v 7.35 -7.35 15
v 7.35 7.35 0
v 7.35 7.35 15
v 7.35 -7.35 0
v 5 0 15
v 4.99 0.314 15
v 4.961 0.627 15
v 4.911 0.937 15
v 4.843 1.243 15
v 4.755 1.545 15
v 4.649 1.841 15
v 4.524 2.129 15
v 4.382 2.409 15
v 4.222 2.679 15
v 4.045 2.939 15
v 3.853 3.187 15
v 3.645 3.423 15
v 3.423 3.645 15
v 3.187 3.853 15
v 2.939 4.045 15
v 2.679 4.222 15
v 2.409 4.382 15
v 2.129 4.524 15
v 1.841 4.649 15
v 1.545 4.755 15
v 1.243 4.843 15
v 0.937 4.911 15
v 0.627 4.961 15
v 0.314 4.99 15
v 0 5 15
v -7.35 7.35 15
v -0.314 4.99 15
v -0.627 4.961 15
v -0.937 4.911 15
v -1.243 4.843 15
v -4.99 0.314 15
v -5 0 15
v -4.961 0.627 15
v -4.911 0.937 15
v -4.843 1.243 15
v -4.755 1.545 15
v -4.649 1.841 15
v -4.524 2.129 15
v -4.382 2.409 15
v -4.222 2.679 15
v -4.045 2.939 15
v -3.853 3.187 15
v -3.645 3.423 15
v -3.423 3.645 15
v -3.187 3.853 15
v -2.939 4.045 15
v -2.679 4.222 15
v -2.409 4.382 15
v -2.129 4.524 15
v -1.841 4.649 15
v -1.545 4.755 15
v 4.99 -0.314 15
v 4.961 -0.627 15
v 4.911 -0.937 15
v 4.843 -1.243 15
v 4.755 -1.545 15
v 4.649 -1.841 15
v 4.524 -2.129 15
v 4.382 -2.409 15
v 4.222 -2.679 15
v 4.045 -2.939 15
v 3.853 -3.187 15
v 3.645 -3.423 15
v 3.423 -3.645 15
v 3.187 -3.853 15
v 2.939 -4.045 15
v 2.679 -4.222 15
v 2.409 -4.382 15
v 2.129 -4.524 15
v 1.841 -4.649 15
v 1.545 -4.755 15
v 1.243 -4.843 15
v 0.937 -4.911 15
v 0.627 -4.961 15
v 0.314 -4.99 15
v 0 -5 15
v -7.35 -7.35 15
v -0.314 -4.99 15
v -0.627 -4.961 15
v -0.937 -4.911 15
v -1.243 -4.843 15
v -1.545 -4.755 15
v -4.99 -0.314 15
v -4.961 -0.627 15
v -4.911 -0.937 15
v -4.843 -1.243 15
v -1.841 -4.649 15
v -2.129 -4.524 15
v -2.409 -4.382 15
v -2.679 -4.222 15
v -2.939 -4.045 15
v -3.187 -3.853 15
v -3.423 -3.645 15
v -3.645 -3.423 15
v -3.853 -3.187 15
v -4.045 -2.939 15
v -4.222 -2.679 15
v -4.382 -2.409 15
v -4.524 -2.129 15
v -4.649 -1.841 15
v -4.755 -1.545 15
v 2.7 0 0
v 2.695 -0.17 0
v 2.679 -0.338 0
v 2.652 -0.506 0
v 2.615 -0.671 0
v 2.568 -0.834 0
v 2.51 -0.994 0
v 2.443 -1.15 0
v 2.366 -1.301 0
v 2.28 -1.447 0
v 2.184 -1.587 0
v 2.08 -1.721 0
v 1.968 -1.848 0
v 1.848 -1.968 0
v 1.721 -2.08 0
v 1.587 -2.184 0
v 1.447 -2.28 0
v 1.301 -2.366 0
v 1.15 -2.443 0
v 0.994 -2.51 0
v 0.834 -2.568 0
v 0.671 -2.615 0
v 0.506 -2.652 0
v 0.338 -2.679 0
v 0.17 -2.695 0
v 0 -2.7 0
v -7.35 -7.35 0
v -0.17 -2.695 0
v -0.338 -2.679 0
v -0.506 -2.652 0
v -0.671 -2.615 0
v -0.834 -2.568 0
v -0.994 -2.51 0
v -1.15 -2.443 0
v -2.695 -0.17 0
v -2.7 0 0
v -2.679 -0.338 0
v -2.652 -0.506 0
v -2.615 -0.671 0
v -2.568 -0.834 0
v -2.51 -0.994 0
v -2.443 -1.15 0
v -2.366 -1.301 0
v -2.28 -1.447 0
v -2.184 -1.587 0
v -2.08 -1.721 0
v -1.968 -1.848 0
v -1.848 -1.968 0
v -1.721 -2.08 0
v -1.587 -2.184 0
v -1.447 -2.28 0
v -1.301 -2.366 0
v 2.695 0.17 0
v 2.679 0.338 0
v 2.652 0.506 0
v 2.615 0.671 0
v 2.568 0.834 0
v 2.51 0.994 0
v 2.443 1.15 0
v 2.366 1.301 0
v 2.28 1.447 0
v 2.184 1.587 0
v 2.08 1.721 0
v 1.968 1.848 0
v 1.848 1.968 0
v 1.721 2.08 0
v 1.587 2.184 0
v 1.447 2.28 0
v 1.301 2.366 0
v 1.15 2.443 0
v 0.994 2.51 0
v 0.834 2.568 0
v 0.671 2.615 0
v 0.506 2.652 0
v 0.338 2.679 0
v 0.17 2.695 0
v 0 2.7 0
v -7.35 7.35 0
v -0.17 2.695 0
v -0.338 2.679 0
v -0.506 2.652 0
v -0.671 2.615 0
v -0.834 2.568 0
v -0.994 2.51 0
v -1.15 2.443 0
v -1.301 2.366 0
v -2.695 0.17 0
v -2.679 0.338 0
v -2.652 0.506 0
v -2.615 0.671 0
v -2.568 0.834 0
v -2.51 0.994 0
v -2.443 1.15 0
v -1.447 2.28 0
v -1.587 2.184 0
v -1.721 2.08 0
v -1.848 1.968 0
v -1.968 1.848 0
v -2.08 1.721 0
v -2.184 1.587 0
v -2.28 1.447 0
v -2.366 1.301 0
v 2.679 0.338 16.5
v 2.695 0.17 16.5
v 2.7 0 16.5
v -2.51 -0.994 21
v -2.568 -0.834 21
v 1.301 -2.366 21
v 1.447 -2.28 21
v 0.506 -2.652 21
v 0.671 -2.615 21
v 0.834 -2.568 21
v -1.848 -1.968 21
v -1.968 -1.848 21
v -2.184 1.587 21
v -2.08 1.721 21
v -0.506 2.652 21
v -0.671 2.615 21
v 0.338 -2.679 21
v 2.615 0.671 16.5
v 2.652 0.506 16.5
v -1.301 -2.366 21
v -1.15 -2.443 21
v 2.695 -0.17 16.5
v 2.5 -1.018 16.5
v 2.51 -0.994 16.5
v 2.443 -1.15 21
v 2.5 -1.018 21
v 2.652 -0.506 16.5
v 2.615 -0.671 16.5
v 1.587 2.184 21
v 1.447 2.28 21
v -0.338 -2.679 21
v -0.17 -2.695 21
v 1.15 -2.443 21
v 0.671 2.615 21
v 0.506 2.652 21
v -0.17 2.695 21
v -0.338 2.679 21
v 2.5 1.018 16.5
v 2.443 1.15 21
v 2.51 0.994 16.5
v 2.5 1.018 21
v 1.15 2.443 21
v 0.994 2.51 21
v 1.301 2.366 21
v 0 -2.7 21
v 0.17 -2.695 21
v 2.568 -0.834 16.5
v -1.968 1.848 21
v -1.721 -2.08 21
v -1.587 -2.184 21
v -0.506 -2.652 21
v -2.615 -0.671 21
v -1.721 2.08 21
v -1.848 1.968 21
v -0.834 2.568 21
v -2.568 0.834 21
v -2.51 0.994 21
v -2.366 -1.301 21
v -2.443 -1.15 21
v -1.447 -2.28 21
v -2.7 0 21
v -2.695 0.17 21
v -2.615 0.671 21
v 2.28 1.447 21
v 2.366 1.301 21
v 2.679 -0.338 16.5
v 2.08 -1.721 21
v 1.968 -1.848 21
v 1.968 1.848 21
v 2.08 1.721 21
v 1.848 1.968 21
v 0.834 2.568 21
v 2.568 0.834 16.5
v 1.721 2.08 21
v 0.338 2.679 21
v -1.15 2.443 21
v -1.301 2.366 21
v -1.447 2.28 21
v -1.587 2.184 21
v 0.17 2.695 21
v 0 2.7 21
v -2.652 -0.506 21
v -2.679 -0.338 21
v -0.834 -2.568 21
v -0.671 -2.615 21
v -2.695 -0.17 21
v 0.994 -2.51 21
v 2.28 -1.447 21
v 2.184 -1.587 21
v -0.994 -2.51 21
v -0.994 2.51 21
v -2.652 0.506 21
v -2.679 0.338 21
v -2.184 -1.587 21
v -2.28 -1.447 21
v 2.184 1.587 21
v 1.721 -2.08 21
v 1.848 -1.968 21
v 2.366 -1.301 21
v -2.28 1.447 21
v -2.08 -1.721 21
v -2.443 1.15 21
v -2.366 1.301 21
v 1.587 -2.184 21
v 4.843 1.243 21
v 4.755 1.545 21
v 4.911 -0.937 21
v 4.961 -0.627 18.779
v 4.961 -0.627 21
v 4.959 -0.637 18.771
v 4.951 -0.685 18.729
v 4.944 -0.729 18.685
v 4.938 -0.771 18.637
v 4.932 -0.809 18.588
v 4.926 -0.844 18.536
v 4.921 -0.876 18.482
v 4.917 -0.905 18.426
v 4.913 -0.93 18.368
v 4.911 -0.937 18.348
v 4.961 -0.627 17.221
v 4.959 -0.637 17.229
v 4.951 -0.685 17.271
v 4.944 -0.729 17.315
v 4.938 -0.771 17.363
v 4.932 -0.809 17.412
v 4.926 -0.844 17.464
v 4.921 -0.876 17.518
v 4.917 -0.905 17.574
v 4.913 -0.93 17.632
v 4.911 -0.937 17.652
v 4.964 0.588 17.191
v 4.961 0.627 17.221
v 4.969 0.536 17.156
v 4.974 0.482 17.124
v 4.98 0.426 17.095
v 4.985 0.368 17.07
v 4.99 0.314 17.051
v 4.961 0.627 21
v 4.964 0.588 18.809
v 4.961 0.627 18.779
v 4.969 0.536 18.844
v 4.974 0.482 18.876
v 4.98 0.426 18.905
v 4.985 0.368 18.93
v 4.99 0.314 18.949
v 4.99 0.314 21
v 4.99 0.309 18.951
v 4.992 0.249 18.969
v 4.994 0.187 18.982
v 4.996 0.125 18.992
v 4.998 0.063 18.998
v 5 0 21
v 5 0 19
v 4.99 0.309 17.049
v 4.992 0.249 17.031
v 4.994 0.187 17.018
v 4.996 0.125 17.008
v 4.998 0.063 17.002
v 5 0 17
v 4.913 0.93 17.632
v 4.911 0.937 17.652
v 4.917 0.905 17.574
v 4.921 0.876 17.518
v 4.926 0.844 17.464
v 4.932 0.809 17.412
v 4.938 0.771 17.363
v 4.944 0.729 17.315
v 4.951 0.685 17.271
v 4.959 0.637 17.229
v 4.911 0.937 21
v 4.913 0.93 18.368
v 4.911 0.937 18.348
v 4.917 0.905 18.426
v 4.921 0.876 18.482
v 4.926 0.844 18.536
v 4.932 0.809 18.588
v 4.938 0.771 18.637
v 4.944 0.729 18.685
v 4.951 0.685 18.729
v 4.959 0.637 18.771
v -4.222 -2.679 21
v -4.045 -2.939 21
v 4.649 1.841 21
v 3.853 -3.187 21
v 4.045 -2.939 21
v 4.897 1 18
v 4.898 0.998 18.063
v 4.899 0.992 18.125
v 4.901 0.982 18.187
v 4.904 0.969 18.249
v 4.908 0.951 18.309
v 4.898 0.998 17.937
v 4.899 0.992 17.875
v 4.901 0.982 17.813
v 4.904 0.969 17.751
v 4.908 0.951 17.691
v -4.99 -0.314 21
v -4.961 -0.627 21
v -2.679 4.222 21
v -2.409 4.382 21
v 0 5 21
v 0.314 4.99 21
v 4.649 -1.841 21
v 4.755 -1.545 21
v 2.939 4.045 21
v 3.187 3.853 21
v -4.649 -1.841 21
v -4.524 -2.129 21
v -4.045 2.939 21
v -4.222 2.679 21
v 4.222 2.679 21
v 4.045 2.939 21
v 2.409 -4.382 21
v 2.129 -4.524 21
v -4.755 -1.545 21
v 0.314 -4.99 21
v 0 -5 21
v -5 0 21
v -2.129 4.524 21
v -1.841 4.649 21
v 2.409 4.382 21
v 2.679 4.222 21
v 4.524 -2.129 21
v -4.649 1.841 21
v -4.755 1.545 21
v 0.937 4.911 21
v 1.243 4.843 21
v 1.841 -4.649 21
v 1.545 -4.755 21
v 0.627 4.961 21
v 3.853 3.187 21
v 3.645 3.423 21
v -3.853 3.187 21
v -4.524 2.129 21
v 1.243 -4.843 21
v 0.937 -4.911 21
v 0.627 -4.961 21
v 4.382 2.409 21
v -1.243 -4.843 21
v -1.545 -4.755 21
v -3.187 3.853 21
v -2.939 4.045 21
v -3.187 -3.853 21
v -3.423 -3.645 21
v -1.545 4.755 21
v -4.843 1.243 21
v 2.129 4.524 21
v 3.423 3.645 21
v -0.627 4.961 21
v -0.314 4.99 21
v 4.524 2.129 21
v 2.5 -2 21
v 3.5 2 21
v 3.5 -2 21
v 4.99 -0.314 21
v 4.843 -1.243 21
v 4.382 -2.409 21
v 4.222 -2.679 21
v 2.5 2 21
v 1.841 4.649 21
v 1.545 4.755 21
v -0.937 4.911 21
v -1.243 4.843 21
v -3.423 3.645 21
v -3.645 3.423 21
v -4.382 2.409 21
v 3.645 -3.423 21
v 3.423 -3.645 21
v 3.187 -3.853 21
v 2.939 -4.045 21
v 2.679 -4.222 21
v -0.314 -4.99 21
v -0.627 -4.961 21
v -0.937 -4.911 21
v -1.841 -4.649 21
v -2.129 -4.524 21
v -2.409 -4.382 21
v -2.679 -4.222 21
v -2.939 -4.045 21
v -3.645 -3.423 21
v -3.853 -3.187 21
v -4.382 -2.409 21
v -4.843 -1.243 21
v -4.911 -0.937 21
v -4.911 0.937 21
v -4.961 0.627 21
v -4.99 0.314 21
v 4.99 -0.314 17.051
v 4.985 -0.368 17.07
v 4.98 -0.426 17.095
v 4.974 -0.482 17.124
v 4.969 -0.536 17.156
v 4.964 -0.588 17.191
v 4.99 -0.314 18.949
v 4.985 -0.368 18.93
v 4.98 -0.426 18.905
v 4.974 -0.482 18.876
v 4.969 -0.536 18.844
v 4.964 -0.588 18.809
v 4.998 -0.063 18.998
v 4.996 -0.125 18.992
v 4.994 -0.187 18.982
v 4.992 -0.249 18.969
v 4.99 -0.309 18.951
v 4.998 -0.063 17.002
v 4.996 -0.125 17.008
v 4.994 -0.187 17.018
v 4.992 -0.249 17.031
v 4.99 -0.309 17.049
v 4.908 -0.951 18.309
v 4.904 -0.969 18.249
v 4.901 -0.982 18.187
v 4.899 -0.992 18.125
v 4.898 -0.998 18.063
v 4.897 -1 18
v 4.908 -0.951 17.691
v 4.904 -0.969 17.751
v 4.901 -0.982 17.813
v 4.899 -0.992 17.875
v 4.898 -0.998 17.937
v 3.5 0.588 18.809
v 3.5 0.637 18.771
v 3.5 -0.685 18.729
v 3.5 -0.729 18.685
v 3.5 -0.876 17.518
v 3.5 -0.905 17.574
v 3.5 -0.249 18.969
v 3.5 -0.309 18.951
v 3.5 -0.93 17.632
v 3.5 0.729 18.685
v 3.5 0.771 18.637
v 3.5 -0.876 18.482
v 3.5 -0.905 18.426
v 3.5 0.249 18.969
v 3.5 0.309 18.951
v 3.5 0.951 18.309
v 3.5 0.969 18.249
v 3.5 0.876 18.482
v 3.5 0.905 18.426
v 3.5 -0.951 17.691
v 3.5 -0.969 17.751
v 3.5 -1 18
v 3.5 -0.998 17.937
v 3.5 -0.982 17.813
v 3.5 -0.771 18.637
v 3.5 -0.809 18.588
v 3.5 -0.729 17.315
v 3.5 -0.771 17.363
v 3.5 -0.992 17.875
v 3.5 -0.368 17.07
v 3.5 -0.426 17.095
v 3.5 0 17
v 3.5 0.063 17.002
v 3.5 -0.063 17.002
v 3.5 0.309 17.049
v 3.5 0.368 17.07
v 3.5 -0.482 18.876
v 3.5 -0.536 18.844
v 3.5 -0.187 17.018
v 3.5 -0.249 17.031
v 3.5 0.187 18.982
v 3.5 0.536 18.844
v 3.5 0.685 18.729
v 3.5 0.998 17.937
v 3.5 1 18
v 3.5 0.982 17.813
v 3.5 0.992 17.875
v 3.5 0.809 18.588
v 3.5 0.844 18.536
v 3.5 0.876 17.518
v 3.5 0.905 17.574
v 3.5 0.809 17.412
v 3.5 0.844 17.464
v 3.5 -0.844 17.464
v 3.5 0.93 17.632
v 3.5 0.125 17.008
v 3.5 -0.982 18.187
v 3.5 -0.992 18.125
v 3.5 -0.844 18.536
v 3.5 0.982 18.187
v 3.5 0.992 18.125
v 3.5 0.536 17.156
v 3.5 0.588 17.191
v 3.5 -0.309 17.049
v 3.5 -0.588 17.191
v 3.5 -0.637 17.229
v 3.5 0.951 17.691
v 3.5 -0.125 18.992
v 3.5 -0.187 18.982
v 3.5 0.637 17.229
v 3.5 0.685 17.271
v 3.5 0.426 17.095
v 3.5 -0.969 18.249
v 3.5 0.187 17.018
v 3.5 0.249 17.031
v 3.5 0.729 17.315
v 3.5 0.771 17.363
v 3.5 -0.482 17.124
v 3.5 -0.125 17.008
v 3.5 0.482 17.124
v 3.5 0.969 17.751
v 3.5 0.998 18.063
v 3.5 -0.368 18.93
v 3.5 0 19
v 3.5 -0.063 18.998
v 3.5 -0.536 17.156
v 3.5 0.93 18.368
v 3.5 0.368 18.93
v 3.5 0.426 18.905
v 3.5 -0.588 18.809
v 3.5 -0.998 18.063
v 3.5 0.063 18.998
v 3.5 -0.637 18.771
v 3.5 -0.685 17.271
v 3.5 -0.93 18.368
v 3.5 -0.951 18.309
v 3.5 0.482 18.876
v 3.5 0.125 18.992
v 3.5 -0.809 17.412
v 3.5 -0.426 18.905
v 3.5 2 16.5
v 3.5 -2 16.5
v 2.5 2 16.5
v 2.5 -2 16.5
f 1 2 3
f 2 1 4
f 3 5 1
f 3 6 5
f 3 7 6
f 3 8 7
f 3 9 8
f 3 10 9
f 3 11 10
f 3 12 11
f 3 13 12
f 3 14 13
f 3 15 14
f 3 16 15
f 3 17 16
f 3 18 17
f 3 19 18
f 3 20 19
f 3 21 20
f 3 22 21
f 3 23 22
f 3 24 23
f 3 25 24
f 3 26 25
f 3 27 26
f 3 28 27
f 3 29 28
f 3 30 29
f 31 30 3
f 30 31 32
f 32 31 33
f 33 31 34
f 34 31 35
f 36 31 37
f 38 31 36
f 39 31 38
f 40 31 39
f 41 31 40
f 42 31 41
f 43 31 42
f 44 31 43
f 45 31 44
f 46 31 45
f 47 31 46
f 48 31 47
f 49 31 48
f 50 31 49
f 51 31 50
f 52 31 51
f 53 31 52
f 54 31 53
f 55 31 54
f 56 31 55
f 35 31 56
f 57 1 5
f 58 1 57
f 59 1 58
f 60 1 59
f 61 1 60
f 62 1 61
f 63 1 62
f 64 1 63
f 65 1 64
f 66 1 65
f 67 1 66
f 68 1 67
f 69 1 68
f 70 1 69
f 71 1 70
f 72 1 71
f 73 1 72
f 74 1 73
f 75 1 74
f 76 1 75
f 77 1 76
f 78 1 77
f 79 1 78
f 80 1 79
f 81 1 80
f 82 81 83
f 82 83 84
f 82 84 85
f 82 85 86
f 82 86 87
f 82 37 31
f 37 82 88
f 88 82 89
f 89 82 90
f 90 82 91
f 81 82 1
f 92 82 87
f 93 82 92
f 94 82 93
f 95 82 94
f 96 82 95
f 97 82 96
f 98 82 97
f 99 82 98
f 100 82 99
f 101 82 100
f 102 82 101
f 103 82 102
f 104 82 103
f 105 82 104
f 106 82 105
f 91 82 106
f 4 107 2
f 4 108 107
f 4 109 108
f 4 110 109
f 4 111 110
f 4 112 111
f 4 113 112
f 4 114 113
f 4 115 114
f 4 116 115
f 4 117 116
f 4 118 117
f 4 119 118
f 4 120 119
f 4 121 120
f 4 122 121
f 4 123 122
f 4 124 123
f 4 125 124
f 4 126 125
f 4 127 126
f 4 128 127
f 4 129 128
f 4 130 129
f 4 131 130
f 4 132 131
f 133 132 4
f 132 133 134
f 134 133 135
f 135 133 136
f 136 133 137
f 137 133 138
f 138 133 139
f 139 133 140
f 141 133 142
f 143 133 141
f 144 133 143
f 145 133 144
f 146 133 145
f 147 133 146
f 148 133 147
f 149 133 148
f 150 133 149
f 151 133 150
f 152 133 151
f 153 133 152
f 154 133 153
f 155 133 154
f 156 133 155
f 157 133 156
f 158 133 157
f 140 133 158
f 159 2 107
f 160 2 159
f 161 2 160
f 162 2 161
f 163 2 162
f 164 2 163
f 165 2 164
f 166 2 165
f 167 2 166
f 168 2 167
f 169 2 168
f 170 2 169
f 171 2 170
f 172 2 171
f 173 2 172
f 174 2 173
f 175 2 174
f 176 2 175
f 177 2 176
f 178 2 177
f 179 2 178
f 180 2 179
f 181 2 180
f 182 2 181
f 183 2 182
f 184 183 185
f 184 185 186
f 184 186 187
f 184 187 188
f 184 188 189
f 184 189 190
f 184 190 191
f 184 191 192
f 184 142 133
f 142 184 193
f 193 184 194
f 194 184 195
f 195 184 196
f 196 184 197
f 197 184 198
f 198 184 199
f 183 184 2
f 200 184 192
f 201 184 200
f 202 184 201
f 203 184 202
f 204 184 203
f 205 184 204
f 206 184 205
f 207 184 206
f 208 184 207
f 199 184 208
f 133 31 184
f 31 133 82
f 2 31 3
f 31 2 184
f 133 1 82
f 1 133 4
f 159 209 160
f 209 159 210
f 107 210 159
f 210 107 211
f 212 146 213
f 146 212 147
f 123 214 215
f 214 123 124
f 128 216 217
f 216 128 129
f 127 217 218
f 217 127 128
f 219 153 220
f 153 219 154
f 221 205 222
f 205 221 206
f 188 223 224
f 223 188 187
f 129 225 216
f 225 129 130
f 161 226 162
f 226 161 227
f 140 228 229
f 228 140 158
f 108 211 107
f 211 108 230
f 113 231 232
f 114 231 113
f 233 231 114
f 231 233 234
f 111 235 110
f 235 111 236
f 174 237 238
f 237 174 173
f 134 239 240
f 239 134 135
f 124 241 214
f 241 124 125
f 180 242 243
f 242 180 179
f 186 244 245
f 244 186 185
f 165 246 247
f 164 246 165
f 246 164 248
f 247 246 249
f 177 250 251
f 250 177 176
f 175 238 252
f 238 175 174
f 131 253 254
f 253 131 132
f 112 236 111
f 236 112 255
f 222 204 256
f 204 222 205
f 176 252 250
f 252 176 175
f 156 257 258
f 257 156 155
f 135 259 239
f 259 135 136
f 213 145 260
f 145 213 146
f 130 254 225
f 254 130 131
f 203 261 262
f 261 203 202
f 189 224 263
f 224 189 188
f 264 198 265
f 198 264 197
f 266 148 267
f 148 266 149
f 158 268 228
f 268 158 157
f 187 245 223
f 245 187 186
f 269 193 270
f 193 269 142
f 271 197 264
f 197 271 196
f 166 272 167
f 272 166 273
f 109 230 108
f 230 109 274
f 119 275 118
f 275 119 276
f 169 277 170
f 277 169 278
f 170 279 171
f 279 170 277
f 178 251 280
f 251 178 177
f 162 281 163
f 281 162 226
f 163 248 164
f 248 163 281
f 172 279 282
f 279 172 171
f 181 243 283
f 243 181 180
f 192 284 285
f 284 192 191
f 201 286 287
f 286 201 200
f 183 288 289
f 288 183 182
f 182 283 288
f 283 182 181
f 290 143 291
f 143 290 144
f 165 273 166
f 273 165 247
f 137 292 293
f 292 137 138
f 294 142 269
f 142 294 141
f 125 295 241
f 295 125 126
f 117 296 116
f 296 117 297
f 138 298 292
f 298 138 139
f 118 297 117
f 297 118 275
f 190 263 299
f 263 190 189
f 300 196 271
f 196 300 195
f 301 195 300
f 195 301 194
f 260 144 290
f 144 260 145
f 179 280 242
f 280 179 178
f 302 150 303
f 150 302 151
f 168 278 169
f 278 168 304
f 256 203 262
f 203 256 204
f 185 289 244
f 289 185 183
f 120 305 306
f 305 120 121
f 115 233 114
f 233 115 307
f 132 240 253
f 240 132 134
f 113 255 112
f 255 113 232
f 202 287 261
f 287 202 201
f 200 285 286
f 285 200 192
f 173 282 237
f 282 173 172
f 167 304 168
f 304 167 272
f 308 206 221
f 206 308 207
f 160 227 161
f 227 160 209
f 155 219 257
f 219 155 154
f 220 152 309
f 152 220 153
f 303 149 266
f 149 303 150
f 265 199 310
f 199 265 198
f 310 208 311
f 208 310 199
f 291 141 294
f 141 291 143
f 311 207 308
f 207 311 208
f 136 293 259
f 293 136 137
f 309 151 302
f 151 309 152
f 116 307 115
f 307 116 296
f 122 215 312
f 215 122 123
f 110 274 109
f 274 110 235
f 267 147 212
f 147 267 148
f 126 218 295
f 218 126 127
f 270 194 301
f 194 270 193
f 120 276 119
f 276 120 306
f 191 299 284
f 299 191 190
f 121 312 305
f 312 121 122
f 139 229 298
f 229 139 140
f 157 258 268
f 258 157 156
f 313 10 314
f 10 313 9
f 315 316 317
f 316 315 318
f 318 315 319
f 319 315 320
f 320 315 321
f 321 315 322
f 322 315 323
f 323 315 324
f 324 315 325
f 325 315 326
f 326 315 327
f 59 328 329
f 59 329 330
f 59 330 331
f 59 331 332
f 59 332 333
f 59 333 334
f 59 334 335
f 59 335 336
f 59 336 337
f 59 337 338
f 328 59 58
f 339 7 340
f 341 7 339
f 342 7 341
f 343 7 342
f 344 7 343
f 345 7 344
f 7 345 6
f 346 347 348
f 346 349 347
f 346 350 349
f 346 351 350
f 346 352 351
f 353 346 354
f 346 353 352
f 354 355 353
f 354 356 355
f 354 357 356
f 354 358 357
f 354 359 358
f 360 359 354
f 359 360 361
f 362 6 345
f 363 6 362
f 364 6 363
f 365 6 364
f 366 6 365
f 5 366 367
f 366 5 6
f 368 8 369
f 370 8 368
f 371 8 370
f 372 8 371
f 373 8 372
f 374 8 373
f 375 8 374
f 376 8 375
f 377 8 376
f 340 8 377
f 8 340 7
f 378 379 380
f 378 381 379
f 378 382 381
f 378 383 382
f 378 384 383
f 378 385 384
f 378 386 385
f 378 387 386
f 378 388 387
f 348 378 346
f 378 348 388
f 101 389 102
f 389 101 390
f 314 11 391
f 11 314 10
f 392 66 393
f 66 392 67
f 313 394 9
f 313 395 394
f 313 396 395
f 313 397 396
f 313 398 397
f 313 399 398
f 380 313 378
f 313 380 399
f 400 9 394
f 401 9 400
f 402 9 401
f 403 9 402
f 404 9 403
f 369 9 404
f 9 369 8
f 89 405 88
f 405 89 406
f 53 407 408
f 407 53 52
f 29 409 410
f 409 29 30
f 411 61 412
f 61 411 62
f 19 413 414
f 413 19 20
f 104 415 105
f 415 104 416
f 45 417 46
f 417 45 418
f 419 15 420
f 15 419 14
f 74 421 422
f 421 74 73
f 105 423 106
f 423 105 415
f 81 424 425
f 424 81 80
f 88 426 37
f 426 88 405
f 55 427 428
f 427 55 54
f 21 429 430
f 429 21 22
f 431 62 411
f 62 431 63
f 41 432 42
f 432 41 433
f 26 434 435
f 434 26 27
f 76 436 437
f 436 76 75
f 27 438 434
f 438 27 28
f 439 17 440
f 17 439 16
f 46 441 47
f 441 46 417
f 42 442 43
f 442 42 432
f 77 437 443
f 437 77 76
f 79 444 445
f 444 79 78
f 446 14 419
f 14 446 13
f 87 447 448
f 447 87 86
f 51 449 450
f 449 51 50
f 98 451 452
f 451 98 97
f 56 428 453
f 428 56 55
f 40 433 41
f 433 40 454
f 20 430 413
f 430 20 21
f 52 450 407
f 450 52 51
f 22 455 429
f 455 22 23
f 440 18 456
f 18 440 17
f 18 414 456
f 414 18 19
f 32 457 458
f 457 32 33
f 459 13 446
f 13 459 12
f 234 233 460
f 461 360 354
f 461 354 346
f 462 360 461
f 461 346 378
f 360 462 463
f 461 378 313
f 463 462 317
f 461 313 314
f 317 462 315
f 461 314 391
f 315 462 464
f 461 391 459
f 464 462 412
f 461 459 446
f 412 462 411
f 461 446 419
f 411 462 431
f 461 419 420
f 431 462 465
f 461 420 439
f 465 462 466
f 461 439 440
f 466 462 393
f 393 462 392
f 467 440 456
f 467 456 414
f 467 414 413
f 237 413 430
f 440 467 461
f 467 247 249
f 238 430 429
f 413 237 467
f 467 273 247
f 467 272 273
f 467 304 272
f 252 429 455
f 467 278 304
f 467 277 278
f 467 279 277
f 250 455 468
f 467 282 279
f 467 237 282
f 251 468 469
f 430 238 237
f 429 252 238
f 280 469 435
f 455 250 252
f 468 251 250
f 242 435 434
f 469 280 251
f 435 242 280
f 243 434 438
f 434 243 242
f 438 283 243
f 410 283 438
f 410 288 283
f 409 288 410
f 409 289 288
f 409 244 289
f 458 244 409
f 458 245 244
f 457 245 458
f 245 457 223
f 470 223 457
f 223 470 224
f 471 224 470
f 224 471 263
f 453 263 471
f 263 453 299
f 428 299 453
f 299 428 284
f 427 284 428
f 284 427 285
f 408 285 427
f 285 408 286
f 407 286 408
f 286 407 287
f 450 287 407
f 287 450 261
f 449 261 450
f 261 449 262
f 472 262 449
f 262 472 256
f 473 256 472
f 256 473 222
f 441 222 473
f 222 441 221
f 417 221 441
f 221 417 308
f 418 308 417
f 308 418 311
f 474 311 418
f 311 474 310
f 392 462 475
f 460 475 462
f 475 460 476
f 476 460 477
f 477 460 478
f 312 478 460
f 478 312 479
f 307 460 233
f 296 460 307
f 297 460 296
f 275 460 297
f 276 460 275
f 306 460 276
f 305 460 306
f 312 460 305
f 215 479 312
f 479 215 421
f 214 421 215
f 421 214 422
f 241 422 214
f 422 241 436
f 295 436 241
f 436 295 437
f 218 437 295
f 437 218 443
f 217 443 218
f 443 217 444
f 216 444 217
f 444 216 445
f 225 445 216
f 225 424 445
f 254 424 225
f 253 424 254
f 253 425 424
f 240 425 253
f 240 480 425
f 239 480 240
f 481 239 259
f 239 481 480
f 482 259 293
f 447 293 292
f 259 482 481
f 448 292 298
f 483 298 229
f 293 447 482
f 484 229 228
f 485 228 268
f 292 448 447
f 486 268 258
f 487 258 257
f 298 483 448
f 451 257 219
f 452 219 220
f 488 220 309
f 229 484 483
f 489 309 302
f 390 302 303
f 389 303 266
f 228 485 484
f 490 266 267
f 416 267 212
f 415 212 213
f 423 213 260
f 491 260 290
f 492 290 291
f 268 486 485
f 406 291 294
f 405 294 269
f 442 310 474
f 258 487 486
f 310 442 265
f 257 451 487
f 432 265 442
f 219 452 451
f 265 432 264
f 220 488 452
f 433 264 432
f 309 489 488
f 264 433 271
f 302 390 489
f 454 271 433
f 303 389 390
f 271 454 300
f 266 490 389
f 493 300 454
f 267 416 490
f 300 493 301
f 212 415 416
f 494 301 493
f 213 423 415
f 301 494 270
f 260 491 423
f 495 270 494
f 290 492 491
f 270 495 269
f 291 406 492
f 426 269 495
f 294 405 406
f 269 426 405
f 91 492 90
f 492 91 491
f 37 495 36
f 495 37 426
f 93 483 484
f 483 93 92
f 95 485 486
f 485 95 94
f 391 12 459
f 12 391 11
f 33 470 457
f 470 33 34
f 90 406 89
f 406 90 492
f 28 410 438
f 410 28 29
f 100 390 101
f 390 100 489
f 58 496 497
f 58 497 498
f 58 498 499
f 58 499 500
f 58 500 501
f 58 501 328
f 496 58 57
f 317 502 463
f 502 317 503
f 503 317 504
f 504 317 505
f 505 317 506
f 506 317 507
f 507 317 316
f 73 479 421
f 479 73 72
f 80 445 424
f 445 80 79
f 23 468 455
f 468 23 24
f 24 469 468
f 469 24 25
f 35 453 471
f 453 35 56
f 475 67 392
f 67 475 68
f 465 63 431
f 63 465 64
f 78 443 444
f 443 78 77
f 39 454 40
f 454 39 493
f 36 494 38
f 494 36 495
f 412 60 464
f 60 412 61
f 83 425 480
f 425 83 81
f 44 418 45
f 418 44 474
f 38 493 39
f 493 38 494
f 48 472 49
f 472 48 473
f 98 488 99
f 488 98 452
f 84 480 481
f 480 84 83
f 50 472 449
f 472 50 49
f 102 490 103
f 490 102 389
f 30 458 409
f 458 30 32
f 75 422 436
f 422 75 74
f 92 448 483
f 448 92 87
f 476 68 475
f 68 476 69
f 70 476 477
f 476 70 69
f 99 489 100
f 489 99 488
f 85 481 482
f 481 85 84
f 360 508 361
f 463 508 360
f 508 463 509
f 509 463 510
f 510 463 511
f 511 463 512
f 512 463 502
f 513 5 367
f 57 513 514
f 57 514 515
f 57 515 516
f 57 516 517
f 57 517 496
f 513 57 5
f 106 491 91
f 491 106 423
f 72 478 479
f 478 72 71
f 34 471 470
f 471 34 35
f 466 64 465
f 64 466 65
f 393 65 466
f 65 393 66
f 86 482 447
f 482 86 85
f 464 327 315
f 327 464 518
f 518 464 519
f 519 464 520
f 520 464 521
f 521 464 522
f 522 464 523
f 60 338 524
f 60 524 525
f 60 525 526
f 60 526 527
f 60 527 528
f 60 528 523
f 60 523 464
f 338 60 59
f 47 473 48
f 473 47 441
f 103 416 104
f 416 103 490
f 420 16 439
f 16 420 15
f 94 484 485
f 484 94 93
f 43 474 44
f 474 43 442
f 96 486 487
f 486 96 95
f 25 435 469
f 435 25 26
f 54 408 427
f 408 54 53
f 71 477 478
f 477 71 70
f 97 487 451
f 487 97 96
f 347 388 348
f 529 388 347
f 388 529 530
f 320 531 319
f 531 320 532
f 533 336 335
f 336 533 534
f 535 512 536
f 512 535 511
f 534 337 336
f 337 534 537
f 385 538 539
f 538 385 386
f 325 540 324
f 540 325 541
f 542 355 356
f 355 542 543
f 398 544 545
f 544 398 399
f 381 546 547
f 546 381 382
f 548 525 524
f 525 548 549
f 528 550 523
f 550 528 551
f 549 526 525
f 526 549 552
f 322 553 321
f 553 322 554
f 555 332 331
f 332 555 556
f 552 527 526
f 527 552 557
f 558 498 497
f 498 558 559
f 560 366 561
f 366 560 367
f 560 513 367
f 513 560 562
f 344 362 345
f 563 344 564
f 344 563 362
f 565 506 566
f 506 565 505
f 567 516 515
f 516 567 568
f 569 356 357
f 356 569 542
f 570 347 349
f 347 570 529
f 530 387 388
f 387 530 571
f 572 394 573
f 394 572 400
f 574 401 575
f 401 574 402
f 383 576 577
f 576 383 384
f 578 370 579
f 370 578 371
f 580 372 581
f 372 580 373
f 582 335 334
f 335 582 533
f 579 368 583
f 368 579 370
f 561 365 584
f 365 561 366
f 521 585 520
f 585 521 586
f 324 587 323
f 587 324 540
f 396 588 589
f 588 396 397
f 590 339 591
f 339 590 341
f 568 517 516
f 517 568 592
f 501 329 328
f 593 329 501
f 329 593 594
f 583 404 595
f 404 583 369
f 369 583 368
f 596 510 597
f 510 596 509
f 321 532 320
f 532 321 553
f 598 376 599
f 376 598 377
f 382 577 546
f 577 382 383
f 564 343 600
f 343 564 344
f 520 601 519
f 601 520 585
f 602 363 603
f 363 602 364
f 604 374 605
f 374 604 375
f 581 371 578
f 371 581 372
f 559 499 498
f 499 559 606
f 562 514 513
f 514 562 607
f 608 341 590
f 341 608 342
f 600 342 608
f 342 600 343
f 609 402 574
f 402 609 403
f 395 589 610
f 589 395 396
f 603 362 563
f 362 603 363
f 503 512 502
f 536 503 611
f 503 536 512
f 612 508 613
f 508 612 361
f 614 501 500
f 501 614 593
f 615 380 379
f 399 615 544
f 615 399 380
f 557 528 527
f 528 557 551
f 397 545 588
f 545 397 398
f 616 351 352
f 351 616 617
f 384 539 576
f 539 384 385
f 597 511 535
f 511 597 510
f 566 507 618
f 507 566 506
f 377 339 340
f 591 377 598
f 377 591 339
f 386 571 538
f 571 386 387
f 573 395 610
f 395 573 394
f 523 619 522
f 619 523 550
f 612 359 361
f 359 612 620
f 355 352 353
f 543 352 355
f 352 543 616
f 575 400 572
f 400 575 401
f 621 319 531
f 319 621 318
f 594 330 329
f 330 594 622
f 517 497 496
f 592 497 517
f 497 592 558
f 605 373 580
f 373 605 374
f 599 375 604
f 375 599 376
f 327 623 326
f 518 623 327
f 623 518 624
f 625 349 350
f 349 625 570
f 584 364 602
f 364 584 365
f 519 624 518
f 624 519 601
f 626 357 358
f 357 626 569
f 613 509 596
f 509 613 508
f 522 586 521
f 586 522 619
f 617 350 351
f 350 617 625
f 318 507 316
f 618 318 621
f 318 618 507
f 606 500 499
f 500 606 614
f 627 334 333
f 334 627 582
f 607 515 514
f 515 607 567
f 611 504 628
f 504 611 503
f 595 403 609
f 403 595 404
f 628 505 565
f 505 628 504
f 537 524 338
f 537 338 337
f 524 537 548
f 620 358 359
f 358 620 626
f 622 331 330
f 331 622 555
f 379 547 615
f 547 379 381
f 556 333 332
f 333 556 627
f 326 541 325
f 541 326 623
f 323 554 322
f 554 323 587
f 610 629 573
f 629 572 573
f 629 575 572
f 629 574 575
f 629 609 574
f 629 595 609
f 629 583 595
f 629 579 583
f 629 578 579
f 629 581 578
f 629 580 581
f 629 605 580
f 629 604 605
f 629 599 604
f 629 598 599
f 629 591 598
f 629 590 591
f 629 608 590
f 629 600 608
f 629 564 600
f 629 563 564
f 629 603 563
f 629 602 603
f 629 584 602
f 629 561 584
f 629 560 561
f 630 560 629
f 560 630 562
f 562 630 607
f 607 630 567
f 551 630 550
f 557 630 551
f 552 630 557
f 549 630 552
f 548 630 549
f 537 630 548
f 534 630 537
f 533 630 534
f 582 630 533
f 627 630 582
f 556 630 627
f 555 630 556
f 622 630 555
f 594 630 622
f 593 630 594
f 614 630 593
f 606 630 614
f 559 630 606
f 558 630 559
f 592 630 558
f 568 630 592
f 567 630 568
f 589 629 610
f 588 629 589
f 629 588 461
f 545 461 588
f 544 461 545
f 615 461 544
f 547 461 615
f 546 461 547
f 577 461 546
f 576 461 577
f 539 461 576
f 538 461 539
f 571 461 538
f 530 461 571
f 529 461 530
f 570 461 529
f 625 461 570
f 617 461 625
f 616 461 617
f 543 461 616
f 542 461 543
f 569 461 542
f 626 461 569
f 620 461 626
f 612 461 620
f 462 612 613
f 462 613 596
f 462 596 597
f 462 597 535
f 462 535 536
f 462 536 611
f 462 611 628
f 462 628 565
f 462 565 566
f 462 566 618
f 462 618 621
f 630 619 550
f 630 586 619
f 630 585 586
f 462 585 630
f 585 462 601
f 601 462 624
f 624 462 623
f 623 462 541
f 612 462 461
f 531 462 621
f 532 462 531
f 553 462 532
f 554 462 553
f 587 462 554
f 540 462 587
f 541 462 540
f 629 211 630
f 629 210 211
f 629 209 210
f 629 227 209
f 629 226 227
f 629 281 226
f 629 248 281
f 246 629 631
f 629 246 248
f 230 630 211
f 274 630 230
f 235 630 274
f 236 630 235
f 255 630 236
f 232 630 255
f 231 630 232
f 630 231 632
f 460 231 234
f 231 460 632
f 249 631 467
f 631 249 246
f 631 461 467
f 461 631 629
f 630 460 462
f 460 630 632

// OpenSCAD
// Jim Samson
// November 14, 2018
// Gear for rat treadmill

$fn=100;

gearPart();

boxLength=14.7;
boxWidth=14.7;
boxHeight=15;

shaftDiameter=5.4;
shaftHeight=22;

topDiameter=10;
topHeight=6;

module gearPart() {
    union() {
        bottomPart();
        topPart();
    }
}

module screwHole() {
    translate([3,0,18]) {
        rotate([0,90,0]) {
            cylinder(d=2,h=2);
        }
    }
}

module rectangleHole() {
    translate([3,0,20]) {
        cube([1,4,7],center=true);
    }
}

module topPart() {
    difference() {
        translate([0,0,boxHeight]) {
            cylinder(d=topDiameter, h=topHeight);
        }
        shaft();
        #screwHole();
        rectangleHole();
    }
}

module bottomPart() {
    difference() {
        box();
        shaft();
    }
}

module box() {
    translate([0,0,boxHeight/2]) {
        cube([boxLength, boxWidth, boxHeight],center=true);
    }
}

module shaft() {
    translate([0,0,-1]) {
        #cylinder(d=shaftDiameter,h=shaftHeight+1);
    }
}
